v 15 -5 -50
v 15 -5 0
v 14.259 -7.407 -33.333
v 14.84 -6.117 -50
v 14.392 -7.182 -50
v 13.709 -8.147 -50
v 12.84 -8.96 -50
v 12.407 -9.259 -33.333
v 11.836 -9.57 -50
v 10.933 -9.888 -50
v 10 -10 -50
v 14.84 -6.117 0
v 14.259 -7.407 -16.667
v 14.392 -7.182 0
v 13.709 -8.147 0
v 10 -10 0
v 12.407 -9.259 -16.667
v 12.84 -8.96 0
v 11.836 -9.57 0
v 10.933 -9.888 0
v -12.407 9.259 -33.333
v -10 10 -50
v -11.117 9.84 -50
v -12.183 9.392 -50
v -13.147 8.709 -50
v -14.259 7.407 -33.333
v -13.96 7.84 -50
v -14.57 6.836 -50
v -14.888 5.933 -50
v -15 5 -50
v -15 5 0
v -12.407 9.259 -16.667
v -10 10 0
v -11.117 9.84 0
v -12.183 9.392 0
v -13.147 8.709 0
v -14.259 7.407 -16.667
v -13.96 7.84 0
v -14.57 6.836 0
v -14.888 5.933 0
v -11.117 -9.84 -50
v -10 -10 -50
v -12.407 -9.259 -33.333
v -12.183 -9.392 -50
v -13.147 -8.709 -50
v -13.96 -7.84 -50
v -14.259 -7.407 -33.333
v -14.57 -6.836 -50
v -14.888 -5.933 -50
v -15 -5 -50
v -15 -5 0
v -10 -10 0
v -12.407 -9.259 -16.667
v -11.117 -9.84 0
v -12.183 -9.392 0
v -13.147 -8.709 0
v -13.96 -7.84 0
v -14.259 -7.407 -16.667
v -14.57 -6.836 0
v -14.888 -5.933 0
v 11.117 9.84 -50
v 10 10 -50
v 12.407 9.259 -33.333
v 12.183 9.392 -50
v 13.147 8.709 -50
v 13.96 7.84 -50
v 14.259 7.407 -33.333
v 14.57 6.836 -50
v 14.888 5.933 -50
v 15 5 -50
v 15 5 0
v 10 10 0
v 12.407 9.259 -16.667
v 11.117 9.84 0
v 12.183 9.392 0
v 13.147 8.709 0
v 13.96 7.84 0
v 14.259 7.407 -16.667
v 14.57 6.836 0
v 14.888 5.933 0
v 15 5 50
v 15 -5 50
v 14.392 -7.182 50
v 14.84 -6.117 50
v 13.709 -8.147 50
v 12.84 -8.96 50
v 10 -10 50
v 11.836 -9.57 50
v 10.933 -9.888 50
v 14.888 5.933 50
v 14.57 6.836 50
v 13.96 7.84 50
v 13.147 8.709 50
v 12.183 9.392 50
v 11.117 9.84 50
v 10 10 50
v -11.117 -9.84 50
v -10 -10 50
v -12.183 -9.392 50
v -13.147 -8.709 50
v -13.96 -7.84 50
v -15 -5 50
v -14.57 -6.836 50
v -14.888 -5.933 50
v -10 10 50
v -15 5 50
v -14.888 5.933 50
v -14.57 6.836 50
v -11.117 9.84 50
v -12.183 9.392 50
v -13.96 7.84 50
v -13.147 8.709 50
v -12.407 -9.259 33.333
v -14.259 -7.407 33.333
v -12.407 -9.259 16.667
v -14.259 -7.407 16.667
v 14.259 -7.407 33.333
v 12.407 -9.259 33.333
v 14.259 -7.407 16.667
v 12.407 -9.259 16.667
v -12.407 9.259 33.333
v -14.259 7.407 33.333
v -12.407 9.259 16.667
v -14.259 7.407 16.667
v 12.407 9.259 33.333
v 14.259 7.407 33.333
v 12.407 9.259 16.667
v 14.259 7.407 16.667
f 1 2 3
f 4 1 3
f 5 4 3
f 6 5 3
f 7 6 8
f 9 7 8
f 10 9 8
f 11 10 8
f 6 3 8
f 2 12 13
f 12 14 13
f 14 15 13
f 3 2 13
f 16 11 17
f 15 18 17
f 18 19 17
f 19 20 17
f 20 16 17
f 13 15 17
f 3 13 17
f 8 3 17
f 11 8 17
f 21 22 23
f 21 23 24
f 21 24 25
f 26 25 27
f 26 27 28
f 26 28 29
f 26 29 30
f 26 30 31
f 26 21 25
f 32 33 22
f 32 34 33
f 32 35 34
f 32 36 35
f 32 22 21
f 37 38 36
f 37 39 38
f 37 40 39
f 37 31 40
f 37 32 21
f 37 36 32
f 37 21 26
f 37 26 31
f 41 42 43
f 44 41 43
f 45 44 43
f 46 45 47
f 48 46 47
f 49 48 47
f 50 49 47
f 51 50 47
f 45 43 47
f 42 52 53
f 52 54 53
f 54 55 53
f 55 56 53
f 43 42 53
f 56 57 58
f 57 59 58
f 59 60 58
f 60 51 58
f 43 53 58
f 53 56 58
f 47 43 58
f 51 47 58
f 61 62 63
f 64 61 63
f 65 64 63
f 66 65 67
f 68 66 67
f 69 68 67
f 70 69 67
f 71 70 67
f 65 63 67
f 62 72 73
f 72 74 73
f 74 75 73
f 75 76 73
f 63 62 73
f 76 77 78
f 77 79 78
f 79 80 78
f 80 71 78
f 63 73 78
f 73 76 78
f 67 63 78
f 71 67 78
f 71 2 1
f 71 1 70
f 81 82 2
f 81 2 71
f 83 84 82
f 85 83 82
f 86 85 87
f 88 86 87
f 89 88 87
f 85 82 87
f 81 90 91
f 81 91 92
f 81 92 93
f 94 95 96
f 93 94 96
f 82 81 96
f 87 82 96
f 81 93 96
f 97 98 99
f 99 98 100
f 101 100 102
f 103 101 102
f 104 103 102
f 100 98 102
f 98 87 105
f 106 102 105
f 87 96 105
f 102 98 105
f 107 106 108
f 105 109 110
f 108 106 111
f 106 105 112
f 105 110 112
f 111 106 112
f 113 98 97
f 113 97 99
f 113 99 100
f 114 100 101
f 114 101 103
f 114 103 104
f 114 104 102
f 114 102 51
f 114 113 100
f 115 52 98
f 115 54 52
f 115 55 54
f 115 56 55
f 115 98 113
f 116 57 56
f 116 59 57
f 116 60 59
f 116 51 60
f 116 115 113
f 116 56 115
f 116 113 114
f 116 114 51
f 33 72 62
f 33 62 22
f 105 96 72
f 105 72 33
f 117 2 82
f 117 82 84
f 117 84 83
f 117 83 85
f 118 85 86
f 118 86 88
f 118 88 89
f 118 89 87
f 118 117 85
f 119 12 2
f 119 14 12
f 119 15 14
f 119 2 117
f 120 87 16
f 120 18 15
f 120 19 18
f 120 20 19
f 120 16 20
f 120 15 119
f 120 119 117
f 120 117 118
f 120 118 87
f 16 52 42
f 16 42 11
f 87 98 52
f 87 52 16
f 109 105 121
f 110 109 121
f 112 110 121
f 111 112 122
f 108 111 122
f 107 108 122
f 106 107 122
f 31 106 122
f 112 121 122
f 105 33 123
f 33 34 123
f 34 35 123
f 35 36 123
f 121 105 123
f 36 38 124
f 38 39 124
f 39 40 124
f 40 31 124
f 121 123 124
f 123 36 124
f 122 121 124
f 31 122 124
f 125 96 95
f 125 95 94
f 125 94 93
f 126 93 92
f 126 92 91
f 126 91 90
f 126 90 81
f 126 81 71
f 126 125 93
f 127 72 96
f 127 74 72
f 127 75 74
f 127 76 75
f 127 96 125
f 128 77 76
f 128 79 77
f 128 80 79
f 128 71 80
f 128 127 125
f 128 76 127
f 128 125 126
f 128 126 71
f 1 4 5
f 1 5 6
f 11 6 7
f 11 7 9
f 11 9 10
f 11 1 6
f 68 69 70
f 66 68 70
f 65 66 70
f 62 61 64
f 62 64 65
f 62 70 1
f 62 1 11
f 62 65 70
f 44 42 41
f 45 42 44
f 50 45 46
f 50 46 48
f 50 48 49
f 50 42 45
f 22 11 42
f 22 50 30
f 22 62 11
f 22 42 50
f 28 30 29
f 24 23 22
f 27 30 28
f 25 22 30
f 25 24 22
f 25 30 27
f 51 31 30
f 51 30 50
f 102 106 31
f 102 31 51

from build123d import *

# Parameters (mm, degrees)
F1_DEPTH = 50


with BuildPart() as f1:
    # F0 (on Top) → F1 (new body, symmetric)
    with BuildSketch(Plane.XY):
        with BuildLine():
            add(Edge.make_bspline(
                [(10, 10), (12.5, 10), (15, 7.5), (15, 5)],
                knots=[0, 0, 0, 0, 7.071068, 7.071068, 7.071068, 7.071068], degree=3))
            Line((10, 10), (-10, 10))
            add(Edge.make_bspline(
                [(-10, 10), (-12.5, 10), (-15, 7.5), (-15, 5)],
                knots=[0, 0, 0, 0, 7.071068, 7.071068, 7.071068, 7.071068], degree=3))
            Line((-15, 5), (-15, -5))
            add(Edge.make_bspline(
                [(-10, -10), (-12.5, -10), (-15, -7.5), (-15, -5)],
                knots=[0, 0, 0, 0, 7.071068, 7.071068, 7.071068, 7.071068], degree=3))
            Line((-10, -10), (10, -10))
            add(Edge.make_bspline(
                [(15, -5), (15, -7.5), (12.5, -10), (10, -10)],
                knots=[0, 0, 0, 0, 7.071068, 7.071068, 7.071068, 7.071068], degree=3))
            Line((15, -5), (15, 5))
        make_face()
    extrude(amount=F1_DEPTH, both=True)


solid = f1.part
